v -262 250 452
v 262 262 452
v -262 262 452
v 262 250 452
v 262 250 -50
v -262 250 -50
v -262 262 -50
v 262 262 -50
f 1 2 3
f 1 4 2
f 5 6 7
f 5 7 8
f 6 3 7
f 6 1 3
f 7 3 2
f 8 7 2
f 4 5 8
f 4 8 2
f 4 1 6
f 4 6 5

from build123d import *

# Parameters (mm, degrees)
F0_W      = 500
F0_H      = 500
F1_DEPTH  = 12
F2_W      = 500
F2_H      = 50
F3_DEPTH  = 6
F6_DEPTH  = 6
F14_DEPTH = 6
F15_R     = 19.99999
F19_DEPTH = 6
F22_DEPTH = 12
F25_DEPTH = 6
F27_W     = 12
F27_H     = 320
F28_DEPTH = 44
F31_W     = 196
F31_H     = 12
F32_DEPTH = 44
F37_DEPTH = 3
F43_DEPTH = 12


# Not quite as in the source:
# - a fillet or chamfer is up to 0.001 mm smaller than in the source, because OpenCascade refuses the exact size


with BuildPart() as f1:
    # F0 (on Top) → F1 (new body)
    with BuildSketch(Plane.XY):
        Rectangle(F0_W, F0_H)
    extrude(amount=F1_DEPTH)


with BuildPart() as f3:
    # F2 (on Right) → F3 (new body, symmetric)
    with BuildSketch(Plane.YZ):
        Rectangle(F2_W, F2_H)
    extrude(amount=F3_DEPTH, both=True)


with BuildPart() as f3_1:
    # F4: moved
    add(f3.part.moved(Location((0, 0, -25))))


with BuildPart() as f6:
    # F5 (on Front) → F6 (new body, symmetric)
    with BuildSketch(Plane.XZ):
        Polygon((-250, -25), (250, -25), (250, 25), (6, 25), (6, 0), (-6, 0), (-6, 25), (-250, 25), align=None)
    extrude(amount=F6_DEPTH, both=True)


with BuildPart() as f6_1:
    # F7: moved
    add(f6.part.moved(Location((0, 80, -25))))


with BuildPart() as f8_1:
    # F8: copy of F6
    add(f6_1.part)


with BuildPart() as f3_2:
    add(f3_1.part)

    # F10: cut F6
    add(f6_1.part, mode=Mode.SUBTRACT)


with BuildPart() as f11_1:
    # F11: copy of F6
    add(f6_1.part.moved(Location((0, 164, 0))))


with BuildPart() as f3_3:
    add(f3_2.part)

    # F12: cut F11_1
    add(f11_1.part, mode=Mode.SUBTRACT)


with BuildPart() as f14:
    # F13 (on Right) → F14 (new body, symmetric)
    with BuildSketch(Plane.YZ):
        Polygon((250, -50), (250, 0), (250, 452), (70, 452), (-110, 452), (-250, 100), (-250, -50), align=None)
        Polygon((0, 412), (70, 412), (140, 412), (140, 372), (0, 372), align=None, mode=Mode.SUBTRACT)
    extrude(amount=F14_DEPTH, both=True)

    # F15 (radius 20 in the source; OpenCascade refuses exactly that, so slightly less here)
    f15_edges = [f14.edges().sort_by_distance(p)[0] for p in [
        (0, 140, 372),
        (0, 140, 412),
        (0, 0, 412),
        (0, 0, 372),
    ]]
    fillet(f15_edges, radius=F15_R)


with BuildPart() as f14_1:
    # F16: moved
    add(f14.part.moved(Location((-256, 0, 0))))


with BuildPart() as f17_1:
    # F17: copy of F14
    add(f14_1.part.moved(Location((512, 0, 0))))


with BuildPart() as f19:
    # F18 (on Front) → F19 (new body, symmetric)
    with BuildSketch(Plane.XZ):
        Polygon((-262, 452), (-262, 0), (-262, -50), (262, -50), (262, 452), align=None)
    extrude(amount=F19_DEPTH, both=True)


with BuildPart() as f19_1:
    # F20: moved
    add(f19.part.moved(Location((0, 256, 0))))


with BuildPart() as f22:
    # F21 (on face) → F22 (new body)
    with BuildSketch(Plane.XY.offset(12)):
        Polygon((262, 262), (0, 262), (-262, 262), (-262, -110), (262, -110), align=None)
    extrude(amount=F22_DEPTH)


with BuildPart() as f22_1:
    # F23: moved
    add(f22.part.moved(Location((0, 0, 440))))


with BuildPart() as f25:
    # F24 (on Front) → F25 (new body, symmetric)
    with BuildSketch(Plane.XZ):
        Polygon((-250, 12), (0, 12), (250, 12), (250, 100), (-250, 100), align=None)
    extrude(amount=F25_DEPTH, both=True)


with BuildPart() as f25_1:
    # F26: moved
    add(f25.part.moved(Location((0, -244, 0))))


with BuildPart() as f28:
    # F27 (on Top) → F28 (new body)
    with BuildSketch(Plane.XY):
        with Locations((-24, -90)):
            Rectangle(F27_W, F27_H)
    extrude(amount=F28_DEPTH)


with BuildPart() as f28_1:
    # F29: moved
    add(f28.part.moved(Location((0, 0, -48))))


with BuildPart() as f30_1:
    # F30: copy of F28
    add(f28_1.part.moved(Location((-208, 0, 0))))


with BuildPart() as f32:
    # F31 (on Top) → F32 (new body)
    with BuildSketch(Plane.XY):
        with Locations((-128, -244)):
            Rectangle(F31_W, F31_H)
    extrude(amount=-F32_DEPTH)


with BuildPart() as f32_1:
    # F33: moved
    add(f32.part.moved(Location((0, 0, -4))))


with BuildPart() as f34_1:
    # F34: copy of F32
    add(f32_1.part.moved(Location((0, 308, 0))))


with BuildPart() as f35_1:
    # F35: copy of F32
    add(f32_1.part.moved(Location((256, 0, 0))))


with BuildPart() as f35_2:
    # F35: copy of F30_1
    add(f30_1.part.moved(Location((256, 0, 0))))


with BuildPart() as f35_3:
    # F35: copy of F28
    add(f28_1.part.moved(Location((256, 0, 0))))


with BuildPart() as f35_4:
    # F35: copy of F34_1
    add(f34_1.part.moved(Location((256, 0, 0))))


with BuildPart() as f37:
    # F36 (on Top) → F37 (new body)
    with BuildSketch(Plane.XY):
        Polygon((-24, -244), (-24, 0), (-24, 64), (-232, 64), (-232, -244), align=None)
    extrude(amount=F37_DEPTH)


with BuildPart() as f37_1:
    # F38: moved
    add(f37.part.moved(Location((0, 0, -44))))


with BuildPart() as f39_1:
    # F39: copy of F37
    add(f37_1.part.moved(Location((256, 0, 0))))


with BuildPart() as f30_1_1:
    add(f30_1.part)

    # F40: cut F37
    add(f37_1.part, mode=Mode.SUBTRACT)


with BuildPart() as f32_2:
    add(f32_1.part)

    # F40: cut F37
    add(f37_1.part, mode=Mode.SUBTRACT)


with BuildPart() as f28_2:
    add(f28_1.part)

    # F40: cut F37
    add(f37_1.part, mode=Mode.SUBTRACT)


with BuildPart() as f34_1_1:
    add(f34_1.part)

    # F40: cut F37
    add(f37_1.part, mode=Mode.SUBTRACT)


with BuildPart() as f35_1_1:
    add(f35_1.part)

    # F41: cut F39_1
    add(f39_1.part, mode=Mode.SUBTRACT)


with BuildPart() as f35_3_1:
    add(f35_3.part)

    # F41: cut F39_1
    add(f39_1.part, mode=Mode.SUBTRACT)


with BuildPart() as f35_4_1:
    add(f35_4.part)

    # F41: cut F39_1
    add(f39_1.part, mode=Mode.SUBTRACT)


with BuildPart() as f35_2_1:
    add(f35_2.part)

    # F41: cut F39_1
    add(f39_1.part, mode=Mode.SUBTRACT)


with BuildPart() as f43:
    # F42 (on Front) → F43 (new body)
    with BuildSketch(Plane.XZ):
        Polygon((0, 12), (0, 0), (0, -50), (262, -50), (262, 12), align=None)
    extrude(amount=F43_DEPTH)


with BuildPart() as f43_1:
    # F44: moved
    add(f43.part.moved(Location((0, -250, 0))))


with BuildPart() as f45_1:
    # F45: copy of F43
    add(f43_1.part.moved(Location((-262, 0, 0))))


solid = f19_1.part
